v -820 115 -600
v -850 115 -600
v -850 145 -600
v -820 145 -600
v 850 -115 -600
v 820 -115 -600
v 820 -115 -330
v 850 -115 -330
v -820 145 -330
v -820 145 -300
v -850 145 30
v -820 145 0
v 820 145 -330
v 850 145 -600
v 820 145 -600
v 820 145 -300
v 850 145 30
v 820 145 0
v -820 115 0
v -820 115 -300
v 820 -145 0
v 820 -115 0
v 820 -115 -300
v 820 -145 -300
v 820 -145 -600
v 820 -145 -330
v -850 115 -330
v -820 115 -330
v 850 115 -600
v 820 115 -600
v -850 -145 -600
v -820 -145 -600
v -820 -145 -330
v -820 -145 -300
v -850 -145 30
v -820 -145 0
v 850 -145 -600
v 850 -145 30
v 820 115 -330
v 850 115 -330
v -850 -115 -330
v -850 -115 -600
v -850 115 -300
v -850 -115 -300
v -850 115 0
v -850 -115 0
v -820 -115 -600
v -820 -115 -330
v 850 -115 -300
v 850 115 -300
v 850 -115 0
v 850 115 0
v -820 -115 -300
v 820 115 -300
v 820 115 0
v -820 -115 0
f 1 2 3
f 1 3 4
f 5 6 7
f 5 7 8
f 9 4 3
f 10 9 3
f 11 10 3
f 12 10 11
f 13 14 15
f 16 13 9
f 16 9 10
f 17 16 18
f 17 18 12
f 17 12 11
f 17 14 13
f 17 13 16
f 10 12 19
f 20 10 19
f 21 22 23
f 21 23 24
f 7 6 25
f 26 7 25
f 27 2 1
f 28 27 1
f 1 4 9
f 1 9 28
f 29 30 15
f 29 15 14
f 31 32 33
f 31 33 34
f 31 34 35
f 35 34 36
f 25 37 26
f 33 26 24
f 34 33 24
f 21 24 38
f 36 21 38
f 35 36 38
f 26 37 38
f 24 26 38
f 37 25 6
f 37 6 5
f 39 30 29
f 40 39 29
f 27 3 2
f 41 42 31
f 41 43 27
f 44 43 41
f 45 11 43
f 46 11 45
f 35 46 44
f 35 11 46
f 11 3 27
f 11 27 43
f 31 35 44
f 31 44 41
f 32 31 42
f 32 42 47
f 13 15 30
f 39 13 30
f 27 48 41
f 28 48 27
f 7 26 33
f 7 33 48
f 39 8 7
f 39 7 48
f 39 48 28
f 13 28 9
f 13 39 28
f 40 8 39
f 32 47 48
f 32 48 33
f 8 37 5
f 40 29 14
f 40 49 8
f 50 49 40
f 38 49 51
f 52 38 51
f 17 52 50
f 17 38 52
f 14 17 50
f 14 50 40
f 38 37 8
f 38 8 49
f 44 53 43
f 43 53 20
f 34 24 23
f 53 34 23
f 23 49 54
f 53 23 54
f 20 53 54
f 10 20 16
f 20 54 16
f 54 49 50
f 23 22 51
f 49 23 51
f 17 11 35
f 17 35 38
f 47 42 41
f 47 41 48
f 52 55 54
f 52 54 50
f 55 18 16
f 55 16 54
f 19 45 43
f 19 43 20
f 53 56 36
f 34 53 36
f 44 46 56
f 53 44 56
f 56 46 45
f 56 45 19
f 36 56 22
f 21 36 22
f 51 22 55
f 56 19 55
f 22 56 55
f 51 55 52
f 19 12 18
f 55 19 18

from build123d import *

# Parameters (mm, degrees)
F0_W          = 1700
F0_H          = 290
F1_DEPTH      = 30
F2_W          = 30
F2_H          = 30
F3_DEPTH      = 600
F4_W          = 290
F4_H          = 30
F5_DEPTH      = 850
F5_DEPTH_BACK = 850


with BuildPart() as f1:
    # F0 (on Top) → F1 (new body)
    with BuildSketch(Plane.XY):
        Rectangle(F0_W, F0_H)
    extrude(amount=F1_DEPTH)

    # F2 (on face) → F3 (join)
    with BuildSketch(Plane(origin=(0, 0, 0), x_dir=(1, 0, 0), z_dir=(0, 0, -1))):
        with Locations((-835, 130)):
            Rectangle(F2_W, F2_H)
        with Locations((835, 130)):
            Rectangle(F2_W, F2_H)
        with Locations((835, -130)):
            Rectangle(F2_W, F2_H)
        with Locations((-835, -130)):
            Rectangle(F2_W, F2_H)
    extrude(amount=F3_DEPTH)

    # F4 (on Right) → F5 (join, two sides)
    with BuildSketch(Plane.YZ) as f5_sk:
        with Locations((0, -315)):
            Rectangle(F4_W, F4_H)
    extrude(amount=F5_DEPTH)
    extrude(f5_sk.sketch, amount=-F5_DEPTH_BACK)


solid = f1.part
